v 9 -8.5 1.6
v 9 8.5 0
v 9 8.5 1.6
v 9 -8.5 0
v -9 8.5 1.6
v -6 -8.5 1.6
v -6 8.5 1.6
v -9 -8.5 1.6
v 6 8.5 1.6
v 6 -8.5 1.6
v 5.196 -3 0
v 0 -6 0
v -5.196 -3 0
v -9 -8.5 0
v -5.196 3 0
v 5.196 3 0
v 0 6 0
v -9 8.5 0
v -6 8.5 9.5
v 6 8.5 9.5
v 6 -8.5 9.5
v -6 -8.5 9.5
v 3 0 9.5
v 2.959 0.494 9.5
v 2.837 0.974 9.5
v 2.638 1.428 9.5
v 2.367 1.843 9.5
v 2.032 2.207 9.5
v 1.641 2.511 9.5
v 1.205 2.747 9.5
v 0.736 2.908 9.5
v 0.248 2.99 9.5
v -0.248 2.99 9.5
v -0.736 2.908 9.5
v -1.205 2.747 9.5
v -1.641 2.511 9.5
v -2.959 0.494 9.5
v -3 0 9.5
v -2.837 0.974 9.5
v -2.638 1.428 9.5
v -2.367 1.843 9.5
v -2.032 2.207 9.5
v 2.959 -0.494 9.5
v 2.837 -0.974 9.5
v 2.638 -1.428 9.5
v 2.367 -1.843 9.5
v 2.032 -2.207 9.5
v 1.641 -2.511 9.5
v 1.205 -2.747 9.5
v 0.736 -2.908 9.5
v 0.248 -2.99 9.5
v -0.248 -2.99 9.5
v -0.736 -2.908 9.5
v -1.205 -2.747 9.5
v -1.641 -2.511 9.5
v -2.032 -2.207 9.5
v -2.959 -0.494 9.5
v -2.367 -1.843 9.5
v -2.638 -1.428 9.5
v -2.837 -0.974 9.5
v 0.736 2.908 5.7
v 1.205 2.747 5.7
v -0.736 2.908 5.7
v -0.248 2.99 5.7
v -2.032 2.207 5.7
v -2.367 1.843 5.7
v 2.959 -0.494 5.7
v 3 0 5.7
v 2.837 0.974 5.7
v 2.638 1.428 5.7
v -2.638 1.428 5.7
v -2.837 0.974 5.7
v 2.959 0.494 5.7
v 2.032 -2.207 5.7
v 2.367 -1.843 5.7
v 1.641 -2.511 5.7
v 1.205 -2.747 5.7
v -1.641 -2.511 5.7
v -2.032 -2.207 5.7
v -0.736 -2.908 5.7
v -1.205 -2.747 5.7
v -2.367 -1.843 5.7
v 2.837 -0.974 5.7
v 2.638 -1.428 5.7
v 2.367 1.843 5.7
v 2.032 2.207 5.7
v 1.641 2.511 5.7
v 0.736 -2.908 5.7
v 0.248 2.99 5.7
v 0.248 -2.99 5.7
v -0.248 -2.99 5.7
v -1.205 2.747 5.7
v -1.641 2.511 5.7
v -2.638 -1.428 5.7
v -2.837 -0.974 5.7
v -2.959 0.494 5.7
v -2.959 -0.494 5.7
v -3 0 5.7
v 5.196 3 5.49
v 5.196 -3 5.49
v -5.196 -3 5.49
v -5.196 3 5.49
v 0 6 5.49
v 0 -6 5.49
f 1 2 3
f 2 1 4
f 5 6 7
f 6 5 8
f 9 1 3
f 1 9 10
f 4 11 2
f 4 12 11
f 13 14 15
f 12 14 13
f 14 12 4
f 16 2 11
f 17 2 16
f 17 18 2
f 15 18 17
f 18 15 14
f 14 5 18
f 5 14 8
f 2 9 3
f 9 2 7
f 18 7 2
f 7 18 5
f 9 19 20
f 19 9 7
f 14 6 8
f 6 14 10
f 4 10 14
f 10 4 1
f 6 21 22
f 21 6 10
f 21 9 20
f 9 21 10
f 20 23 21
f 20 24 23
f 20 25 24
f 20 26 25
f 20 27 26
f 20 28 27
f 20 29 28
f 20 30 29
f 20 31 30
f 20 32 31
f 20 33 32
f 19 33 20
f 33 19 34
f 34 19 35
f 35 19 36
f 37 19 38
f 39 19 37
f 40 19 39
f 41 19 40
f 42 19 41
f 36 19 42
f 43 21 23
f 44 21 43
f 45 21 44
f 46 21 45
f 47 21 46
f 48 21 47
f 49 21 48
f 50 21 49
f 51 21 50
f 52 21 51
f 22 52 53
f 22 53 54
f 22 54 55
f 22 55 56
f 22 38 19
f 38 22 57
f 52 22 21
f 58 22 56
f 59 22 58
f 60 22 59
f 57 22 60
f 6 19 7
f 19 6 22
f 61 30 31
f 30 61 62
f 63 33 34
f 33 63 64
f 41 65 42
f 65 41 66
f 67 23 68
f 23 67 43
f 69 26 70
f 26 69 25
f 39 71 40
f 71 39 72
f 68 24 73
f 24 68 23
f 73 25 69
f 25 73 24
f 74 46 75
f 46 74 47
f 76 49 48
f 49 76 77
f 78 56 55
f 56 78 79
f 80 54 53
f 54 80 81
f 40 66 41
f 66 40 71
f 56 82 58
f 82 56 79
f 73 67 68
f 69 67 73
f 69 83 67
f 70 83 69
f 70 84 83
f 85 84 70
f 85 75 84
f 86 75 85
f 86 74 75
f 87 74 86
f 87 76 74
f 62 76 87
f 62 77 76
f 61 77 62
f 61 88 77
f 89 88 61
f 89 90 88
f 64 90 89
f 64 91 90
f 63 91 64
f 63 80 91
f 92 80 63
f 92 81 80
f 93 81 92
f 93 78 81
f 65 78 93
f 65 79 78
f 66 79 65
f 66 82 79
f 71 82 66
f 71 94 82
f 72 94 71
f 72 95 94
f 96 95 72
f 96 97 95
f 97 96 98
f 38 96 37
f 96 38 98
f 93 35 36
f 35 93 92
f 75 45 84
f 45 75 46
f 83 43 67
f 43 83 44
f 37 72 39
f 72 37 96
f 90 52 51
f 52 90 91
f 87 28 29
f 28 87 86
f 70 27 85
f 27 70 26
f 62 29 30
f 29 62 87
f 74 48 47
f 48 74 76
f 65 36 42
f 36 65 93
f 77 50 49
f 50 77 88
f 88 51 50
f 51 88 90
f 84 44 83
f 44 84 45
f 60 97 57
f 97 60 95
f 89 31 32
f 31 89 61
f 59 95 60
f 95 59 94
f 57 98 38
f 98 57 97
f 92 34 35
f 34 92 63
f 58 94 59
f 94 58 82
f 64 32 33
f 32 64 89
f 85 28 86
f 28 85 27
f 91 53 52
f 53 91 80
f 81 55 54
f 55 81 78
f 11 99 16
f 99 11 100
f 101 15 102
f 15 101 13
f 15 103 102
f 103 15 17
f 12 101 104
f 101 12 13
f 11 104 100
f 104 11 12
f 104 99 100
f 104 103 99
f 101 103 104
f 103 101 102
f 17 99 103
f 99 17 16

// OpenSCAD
//A part to fix camera shoe to a threaded rod
//Used for holding camera in the air for 3d-scanning
//Motivation: bottom shape of the camera is uninterrupted
$fa=1/1;
$fs=1/2;
bissl=1/100;
shoe_narrow=12;
shoe_wide=18;
shoe_depth=17;
shoe_thickness=1.6;
thread=6;
hex=12;
nut_h=5.5;
wall=4;
layer=0.2;
difference() {
  union() {
    translate([-shoe_wide/2,-shoe_depth/2,0])cube([shoe_wide,shoe_depth,shoe_thickness]);
    translate([-shoe_narrow/2,-shoe_depth/2,shoe_thickness]) cube([shoe_narrow,shoe_depth,nut_h+wall-shoe_thickness]);
  }
  translate([0,0,nut_h+layer])cylinder(d=thread, h=wall);
  rotate([0,0,90])translate([0,0,-bissl])cylinder(d=hex, h=nut_h,$fn=6);
}
